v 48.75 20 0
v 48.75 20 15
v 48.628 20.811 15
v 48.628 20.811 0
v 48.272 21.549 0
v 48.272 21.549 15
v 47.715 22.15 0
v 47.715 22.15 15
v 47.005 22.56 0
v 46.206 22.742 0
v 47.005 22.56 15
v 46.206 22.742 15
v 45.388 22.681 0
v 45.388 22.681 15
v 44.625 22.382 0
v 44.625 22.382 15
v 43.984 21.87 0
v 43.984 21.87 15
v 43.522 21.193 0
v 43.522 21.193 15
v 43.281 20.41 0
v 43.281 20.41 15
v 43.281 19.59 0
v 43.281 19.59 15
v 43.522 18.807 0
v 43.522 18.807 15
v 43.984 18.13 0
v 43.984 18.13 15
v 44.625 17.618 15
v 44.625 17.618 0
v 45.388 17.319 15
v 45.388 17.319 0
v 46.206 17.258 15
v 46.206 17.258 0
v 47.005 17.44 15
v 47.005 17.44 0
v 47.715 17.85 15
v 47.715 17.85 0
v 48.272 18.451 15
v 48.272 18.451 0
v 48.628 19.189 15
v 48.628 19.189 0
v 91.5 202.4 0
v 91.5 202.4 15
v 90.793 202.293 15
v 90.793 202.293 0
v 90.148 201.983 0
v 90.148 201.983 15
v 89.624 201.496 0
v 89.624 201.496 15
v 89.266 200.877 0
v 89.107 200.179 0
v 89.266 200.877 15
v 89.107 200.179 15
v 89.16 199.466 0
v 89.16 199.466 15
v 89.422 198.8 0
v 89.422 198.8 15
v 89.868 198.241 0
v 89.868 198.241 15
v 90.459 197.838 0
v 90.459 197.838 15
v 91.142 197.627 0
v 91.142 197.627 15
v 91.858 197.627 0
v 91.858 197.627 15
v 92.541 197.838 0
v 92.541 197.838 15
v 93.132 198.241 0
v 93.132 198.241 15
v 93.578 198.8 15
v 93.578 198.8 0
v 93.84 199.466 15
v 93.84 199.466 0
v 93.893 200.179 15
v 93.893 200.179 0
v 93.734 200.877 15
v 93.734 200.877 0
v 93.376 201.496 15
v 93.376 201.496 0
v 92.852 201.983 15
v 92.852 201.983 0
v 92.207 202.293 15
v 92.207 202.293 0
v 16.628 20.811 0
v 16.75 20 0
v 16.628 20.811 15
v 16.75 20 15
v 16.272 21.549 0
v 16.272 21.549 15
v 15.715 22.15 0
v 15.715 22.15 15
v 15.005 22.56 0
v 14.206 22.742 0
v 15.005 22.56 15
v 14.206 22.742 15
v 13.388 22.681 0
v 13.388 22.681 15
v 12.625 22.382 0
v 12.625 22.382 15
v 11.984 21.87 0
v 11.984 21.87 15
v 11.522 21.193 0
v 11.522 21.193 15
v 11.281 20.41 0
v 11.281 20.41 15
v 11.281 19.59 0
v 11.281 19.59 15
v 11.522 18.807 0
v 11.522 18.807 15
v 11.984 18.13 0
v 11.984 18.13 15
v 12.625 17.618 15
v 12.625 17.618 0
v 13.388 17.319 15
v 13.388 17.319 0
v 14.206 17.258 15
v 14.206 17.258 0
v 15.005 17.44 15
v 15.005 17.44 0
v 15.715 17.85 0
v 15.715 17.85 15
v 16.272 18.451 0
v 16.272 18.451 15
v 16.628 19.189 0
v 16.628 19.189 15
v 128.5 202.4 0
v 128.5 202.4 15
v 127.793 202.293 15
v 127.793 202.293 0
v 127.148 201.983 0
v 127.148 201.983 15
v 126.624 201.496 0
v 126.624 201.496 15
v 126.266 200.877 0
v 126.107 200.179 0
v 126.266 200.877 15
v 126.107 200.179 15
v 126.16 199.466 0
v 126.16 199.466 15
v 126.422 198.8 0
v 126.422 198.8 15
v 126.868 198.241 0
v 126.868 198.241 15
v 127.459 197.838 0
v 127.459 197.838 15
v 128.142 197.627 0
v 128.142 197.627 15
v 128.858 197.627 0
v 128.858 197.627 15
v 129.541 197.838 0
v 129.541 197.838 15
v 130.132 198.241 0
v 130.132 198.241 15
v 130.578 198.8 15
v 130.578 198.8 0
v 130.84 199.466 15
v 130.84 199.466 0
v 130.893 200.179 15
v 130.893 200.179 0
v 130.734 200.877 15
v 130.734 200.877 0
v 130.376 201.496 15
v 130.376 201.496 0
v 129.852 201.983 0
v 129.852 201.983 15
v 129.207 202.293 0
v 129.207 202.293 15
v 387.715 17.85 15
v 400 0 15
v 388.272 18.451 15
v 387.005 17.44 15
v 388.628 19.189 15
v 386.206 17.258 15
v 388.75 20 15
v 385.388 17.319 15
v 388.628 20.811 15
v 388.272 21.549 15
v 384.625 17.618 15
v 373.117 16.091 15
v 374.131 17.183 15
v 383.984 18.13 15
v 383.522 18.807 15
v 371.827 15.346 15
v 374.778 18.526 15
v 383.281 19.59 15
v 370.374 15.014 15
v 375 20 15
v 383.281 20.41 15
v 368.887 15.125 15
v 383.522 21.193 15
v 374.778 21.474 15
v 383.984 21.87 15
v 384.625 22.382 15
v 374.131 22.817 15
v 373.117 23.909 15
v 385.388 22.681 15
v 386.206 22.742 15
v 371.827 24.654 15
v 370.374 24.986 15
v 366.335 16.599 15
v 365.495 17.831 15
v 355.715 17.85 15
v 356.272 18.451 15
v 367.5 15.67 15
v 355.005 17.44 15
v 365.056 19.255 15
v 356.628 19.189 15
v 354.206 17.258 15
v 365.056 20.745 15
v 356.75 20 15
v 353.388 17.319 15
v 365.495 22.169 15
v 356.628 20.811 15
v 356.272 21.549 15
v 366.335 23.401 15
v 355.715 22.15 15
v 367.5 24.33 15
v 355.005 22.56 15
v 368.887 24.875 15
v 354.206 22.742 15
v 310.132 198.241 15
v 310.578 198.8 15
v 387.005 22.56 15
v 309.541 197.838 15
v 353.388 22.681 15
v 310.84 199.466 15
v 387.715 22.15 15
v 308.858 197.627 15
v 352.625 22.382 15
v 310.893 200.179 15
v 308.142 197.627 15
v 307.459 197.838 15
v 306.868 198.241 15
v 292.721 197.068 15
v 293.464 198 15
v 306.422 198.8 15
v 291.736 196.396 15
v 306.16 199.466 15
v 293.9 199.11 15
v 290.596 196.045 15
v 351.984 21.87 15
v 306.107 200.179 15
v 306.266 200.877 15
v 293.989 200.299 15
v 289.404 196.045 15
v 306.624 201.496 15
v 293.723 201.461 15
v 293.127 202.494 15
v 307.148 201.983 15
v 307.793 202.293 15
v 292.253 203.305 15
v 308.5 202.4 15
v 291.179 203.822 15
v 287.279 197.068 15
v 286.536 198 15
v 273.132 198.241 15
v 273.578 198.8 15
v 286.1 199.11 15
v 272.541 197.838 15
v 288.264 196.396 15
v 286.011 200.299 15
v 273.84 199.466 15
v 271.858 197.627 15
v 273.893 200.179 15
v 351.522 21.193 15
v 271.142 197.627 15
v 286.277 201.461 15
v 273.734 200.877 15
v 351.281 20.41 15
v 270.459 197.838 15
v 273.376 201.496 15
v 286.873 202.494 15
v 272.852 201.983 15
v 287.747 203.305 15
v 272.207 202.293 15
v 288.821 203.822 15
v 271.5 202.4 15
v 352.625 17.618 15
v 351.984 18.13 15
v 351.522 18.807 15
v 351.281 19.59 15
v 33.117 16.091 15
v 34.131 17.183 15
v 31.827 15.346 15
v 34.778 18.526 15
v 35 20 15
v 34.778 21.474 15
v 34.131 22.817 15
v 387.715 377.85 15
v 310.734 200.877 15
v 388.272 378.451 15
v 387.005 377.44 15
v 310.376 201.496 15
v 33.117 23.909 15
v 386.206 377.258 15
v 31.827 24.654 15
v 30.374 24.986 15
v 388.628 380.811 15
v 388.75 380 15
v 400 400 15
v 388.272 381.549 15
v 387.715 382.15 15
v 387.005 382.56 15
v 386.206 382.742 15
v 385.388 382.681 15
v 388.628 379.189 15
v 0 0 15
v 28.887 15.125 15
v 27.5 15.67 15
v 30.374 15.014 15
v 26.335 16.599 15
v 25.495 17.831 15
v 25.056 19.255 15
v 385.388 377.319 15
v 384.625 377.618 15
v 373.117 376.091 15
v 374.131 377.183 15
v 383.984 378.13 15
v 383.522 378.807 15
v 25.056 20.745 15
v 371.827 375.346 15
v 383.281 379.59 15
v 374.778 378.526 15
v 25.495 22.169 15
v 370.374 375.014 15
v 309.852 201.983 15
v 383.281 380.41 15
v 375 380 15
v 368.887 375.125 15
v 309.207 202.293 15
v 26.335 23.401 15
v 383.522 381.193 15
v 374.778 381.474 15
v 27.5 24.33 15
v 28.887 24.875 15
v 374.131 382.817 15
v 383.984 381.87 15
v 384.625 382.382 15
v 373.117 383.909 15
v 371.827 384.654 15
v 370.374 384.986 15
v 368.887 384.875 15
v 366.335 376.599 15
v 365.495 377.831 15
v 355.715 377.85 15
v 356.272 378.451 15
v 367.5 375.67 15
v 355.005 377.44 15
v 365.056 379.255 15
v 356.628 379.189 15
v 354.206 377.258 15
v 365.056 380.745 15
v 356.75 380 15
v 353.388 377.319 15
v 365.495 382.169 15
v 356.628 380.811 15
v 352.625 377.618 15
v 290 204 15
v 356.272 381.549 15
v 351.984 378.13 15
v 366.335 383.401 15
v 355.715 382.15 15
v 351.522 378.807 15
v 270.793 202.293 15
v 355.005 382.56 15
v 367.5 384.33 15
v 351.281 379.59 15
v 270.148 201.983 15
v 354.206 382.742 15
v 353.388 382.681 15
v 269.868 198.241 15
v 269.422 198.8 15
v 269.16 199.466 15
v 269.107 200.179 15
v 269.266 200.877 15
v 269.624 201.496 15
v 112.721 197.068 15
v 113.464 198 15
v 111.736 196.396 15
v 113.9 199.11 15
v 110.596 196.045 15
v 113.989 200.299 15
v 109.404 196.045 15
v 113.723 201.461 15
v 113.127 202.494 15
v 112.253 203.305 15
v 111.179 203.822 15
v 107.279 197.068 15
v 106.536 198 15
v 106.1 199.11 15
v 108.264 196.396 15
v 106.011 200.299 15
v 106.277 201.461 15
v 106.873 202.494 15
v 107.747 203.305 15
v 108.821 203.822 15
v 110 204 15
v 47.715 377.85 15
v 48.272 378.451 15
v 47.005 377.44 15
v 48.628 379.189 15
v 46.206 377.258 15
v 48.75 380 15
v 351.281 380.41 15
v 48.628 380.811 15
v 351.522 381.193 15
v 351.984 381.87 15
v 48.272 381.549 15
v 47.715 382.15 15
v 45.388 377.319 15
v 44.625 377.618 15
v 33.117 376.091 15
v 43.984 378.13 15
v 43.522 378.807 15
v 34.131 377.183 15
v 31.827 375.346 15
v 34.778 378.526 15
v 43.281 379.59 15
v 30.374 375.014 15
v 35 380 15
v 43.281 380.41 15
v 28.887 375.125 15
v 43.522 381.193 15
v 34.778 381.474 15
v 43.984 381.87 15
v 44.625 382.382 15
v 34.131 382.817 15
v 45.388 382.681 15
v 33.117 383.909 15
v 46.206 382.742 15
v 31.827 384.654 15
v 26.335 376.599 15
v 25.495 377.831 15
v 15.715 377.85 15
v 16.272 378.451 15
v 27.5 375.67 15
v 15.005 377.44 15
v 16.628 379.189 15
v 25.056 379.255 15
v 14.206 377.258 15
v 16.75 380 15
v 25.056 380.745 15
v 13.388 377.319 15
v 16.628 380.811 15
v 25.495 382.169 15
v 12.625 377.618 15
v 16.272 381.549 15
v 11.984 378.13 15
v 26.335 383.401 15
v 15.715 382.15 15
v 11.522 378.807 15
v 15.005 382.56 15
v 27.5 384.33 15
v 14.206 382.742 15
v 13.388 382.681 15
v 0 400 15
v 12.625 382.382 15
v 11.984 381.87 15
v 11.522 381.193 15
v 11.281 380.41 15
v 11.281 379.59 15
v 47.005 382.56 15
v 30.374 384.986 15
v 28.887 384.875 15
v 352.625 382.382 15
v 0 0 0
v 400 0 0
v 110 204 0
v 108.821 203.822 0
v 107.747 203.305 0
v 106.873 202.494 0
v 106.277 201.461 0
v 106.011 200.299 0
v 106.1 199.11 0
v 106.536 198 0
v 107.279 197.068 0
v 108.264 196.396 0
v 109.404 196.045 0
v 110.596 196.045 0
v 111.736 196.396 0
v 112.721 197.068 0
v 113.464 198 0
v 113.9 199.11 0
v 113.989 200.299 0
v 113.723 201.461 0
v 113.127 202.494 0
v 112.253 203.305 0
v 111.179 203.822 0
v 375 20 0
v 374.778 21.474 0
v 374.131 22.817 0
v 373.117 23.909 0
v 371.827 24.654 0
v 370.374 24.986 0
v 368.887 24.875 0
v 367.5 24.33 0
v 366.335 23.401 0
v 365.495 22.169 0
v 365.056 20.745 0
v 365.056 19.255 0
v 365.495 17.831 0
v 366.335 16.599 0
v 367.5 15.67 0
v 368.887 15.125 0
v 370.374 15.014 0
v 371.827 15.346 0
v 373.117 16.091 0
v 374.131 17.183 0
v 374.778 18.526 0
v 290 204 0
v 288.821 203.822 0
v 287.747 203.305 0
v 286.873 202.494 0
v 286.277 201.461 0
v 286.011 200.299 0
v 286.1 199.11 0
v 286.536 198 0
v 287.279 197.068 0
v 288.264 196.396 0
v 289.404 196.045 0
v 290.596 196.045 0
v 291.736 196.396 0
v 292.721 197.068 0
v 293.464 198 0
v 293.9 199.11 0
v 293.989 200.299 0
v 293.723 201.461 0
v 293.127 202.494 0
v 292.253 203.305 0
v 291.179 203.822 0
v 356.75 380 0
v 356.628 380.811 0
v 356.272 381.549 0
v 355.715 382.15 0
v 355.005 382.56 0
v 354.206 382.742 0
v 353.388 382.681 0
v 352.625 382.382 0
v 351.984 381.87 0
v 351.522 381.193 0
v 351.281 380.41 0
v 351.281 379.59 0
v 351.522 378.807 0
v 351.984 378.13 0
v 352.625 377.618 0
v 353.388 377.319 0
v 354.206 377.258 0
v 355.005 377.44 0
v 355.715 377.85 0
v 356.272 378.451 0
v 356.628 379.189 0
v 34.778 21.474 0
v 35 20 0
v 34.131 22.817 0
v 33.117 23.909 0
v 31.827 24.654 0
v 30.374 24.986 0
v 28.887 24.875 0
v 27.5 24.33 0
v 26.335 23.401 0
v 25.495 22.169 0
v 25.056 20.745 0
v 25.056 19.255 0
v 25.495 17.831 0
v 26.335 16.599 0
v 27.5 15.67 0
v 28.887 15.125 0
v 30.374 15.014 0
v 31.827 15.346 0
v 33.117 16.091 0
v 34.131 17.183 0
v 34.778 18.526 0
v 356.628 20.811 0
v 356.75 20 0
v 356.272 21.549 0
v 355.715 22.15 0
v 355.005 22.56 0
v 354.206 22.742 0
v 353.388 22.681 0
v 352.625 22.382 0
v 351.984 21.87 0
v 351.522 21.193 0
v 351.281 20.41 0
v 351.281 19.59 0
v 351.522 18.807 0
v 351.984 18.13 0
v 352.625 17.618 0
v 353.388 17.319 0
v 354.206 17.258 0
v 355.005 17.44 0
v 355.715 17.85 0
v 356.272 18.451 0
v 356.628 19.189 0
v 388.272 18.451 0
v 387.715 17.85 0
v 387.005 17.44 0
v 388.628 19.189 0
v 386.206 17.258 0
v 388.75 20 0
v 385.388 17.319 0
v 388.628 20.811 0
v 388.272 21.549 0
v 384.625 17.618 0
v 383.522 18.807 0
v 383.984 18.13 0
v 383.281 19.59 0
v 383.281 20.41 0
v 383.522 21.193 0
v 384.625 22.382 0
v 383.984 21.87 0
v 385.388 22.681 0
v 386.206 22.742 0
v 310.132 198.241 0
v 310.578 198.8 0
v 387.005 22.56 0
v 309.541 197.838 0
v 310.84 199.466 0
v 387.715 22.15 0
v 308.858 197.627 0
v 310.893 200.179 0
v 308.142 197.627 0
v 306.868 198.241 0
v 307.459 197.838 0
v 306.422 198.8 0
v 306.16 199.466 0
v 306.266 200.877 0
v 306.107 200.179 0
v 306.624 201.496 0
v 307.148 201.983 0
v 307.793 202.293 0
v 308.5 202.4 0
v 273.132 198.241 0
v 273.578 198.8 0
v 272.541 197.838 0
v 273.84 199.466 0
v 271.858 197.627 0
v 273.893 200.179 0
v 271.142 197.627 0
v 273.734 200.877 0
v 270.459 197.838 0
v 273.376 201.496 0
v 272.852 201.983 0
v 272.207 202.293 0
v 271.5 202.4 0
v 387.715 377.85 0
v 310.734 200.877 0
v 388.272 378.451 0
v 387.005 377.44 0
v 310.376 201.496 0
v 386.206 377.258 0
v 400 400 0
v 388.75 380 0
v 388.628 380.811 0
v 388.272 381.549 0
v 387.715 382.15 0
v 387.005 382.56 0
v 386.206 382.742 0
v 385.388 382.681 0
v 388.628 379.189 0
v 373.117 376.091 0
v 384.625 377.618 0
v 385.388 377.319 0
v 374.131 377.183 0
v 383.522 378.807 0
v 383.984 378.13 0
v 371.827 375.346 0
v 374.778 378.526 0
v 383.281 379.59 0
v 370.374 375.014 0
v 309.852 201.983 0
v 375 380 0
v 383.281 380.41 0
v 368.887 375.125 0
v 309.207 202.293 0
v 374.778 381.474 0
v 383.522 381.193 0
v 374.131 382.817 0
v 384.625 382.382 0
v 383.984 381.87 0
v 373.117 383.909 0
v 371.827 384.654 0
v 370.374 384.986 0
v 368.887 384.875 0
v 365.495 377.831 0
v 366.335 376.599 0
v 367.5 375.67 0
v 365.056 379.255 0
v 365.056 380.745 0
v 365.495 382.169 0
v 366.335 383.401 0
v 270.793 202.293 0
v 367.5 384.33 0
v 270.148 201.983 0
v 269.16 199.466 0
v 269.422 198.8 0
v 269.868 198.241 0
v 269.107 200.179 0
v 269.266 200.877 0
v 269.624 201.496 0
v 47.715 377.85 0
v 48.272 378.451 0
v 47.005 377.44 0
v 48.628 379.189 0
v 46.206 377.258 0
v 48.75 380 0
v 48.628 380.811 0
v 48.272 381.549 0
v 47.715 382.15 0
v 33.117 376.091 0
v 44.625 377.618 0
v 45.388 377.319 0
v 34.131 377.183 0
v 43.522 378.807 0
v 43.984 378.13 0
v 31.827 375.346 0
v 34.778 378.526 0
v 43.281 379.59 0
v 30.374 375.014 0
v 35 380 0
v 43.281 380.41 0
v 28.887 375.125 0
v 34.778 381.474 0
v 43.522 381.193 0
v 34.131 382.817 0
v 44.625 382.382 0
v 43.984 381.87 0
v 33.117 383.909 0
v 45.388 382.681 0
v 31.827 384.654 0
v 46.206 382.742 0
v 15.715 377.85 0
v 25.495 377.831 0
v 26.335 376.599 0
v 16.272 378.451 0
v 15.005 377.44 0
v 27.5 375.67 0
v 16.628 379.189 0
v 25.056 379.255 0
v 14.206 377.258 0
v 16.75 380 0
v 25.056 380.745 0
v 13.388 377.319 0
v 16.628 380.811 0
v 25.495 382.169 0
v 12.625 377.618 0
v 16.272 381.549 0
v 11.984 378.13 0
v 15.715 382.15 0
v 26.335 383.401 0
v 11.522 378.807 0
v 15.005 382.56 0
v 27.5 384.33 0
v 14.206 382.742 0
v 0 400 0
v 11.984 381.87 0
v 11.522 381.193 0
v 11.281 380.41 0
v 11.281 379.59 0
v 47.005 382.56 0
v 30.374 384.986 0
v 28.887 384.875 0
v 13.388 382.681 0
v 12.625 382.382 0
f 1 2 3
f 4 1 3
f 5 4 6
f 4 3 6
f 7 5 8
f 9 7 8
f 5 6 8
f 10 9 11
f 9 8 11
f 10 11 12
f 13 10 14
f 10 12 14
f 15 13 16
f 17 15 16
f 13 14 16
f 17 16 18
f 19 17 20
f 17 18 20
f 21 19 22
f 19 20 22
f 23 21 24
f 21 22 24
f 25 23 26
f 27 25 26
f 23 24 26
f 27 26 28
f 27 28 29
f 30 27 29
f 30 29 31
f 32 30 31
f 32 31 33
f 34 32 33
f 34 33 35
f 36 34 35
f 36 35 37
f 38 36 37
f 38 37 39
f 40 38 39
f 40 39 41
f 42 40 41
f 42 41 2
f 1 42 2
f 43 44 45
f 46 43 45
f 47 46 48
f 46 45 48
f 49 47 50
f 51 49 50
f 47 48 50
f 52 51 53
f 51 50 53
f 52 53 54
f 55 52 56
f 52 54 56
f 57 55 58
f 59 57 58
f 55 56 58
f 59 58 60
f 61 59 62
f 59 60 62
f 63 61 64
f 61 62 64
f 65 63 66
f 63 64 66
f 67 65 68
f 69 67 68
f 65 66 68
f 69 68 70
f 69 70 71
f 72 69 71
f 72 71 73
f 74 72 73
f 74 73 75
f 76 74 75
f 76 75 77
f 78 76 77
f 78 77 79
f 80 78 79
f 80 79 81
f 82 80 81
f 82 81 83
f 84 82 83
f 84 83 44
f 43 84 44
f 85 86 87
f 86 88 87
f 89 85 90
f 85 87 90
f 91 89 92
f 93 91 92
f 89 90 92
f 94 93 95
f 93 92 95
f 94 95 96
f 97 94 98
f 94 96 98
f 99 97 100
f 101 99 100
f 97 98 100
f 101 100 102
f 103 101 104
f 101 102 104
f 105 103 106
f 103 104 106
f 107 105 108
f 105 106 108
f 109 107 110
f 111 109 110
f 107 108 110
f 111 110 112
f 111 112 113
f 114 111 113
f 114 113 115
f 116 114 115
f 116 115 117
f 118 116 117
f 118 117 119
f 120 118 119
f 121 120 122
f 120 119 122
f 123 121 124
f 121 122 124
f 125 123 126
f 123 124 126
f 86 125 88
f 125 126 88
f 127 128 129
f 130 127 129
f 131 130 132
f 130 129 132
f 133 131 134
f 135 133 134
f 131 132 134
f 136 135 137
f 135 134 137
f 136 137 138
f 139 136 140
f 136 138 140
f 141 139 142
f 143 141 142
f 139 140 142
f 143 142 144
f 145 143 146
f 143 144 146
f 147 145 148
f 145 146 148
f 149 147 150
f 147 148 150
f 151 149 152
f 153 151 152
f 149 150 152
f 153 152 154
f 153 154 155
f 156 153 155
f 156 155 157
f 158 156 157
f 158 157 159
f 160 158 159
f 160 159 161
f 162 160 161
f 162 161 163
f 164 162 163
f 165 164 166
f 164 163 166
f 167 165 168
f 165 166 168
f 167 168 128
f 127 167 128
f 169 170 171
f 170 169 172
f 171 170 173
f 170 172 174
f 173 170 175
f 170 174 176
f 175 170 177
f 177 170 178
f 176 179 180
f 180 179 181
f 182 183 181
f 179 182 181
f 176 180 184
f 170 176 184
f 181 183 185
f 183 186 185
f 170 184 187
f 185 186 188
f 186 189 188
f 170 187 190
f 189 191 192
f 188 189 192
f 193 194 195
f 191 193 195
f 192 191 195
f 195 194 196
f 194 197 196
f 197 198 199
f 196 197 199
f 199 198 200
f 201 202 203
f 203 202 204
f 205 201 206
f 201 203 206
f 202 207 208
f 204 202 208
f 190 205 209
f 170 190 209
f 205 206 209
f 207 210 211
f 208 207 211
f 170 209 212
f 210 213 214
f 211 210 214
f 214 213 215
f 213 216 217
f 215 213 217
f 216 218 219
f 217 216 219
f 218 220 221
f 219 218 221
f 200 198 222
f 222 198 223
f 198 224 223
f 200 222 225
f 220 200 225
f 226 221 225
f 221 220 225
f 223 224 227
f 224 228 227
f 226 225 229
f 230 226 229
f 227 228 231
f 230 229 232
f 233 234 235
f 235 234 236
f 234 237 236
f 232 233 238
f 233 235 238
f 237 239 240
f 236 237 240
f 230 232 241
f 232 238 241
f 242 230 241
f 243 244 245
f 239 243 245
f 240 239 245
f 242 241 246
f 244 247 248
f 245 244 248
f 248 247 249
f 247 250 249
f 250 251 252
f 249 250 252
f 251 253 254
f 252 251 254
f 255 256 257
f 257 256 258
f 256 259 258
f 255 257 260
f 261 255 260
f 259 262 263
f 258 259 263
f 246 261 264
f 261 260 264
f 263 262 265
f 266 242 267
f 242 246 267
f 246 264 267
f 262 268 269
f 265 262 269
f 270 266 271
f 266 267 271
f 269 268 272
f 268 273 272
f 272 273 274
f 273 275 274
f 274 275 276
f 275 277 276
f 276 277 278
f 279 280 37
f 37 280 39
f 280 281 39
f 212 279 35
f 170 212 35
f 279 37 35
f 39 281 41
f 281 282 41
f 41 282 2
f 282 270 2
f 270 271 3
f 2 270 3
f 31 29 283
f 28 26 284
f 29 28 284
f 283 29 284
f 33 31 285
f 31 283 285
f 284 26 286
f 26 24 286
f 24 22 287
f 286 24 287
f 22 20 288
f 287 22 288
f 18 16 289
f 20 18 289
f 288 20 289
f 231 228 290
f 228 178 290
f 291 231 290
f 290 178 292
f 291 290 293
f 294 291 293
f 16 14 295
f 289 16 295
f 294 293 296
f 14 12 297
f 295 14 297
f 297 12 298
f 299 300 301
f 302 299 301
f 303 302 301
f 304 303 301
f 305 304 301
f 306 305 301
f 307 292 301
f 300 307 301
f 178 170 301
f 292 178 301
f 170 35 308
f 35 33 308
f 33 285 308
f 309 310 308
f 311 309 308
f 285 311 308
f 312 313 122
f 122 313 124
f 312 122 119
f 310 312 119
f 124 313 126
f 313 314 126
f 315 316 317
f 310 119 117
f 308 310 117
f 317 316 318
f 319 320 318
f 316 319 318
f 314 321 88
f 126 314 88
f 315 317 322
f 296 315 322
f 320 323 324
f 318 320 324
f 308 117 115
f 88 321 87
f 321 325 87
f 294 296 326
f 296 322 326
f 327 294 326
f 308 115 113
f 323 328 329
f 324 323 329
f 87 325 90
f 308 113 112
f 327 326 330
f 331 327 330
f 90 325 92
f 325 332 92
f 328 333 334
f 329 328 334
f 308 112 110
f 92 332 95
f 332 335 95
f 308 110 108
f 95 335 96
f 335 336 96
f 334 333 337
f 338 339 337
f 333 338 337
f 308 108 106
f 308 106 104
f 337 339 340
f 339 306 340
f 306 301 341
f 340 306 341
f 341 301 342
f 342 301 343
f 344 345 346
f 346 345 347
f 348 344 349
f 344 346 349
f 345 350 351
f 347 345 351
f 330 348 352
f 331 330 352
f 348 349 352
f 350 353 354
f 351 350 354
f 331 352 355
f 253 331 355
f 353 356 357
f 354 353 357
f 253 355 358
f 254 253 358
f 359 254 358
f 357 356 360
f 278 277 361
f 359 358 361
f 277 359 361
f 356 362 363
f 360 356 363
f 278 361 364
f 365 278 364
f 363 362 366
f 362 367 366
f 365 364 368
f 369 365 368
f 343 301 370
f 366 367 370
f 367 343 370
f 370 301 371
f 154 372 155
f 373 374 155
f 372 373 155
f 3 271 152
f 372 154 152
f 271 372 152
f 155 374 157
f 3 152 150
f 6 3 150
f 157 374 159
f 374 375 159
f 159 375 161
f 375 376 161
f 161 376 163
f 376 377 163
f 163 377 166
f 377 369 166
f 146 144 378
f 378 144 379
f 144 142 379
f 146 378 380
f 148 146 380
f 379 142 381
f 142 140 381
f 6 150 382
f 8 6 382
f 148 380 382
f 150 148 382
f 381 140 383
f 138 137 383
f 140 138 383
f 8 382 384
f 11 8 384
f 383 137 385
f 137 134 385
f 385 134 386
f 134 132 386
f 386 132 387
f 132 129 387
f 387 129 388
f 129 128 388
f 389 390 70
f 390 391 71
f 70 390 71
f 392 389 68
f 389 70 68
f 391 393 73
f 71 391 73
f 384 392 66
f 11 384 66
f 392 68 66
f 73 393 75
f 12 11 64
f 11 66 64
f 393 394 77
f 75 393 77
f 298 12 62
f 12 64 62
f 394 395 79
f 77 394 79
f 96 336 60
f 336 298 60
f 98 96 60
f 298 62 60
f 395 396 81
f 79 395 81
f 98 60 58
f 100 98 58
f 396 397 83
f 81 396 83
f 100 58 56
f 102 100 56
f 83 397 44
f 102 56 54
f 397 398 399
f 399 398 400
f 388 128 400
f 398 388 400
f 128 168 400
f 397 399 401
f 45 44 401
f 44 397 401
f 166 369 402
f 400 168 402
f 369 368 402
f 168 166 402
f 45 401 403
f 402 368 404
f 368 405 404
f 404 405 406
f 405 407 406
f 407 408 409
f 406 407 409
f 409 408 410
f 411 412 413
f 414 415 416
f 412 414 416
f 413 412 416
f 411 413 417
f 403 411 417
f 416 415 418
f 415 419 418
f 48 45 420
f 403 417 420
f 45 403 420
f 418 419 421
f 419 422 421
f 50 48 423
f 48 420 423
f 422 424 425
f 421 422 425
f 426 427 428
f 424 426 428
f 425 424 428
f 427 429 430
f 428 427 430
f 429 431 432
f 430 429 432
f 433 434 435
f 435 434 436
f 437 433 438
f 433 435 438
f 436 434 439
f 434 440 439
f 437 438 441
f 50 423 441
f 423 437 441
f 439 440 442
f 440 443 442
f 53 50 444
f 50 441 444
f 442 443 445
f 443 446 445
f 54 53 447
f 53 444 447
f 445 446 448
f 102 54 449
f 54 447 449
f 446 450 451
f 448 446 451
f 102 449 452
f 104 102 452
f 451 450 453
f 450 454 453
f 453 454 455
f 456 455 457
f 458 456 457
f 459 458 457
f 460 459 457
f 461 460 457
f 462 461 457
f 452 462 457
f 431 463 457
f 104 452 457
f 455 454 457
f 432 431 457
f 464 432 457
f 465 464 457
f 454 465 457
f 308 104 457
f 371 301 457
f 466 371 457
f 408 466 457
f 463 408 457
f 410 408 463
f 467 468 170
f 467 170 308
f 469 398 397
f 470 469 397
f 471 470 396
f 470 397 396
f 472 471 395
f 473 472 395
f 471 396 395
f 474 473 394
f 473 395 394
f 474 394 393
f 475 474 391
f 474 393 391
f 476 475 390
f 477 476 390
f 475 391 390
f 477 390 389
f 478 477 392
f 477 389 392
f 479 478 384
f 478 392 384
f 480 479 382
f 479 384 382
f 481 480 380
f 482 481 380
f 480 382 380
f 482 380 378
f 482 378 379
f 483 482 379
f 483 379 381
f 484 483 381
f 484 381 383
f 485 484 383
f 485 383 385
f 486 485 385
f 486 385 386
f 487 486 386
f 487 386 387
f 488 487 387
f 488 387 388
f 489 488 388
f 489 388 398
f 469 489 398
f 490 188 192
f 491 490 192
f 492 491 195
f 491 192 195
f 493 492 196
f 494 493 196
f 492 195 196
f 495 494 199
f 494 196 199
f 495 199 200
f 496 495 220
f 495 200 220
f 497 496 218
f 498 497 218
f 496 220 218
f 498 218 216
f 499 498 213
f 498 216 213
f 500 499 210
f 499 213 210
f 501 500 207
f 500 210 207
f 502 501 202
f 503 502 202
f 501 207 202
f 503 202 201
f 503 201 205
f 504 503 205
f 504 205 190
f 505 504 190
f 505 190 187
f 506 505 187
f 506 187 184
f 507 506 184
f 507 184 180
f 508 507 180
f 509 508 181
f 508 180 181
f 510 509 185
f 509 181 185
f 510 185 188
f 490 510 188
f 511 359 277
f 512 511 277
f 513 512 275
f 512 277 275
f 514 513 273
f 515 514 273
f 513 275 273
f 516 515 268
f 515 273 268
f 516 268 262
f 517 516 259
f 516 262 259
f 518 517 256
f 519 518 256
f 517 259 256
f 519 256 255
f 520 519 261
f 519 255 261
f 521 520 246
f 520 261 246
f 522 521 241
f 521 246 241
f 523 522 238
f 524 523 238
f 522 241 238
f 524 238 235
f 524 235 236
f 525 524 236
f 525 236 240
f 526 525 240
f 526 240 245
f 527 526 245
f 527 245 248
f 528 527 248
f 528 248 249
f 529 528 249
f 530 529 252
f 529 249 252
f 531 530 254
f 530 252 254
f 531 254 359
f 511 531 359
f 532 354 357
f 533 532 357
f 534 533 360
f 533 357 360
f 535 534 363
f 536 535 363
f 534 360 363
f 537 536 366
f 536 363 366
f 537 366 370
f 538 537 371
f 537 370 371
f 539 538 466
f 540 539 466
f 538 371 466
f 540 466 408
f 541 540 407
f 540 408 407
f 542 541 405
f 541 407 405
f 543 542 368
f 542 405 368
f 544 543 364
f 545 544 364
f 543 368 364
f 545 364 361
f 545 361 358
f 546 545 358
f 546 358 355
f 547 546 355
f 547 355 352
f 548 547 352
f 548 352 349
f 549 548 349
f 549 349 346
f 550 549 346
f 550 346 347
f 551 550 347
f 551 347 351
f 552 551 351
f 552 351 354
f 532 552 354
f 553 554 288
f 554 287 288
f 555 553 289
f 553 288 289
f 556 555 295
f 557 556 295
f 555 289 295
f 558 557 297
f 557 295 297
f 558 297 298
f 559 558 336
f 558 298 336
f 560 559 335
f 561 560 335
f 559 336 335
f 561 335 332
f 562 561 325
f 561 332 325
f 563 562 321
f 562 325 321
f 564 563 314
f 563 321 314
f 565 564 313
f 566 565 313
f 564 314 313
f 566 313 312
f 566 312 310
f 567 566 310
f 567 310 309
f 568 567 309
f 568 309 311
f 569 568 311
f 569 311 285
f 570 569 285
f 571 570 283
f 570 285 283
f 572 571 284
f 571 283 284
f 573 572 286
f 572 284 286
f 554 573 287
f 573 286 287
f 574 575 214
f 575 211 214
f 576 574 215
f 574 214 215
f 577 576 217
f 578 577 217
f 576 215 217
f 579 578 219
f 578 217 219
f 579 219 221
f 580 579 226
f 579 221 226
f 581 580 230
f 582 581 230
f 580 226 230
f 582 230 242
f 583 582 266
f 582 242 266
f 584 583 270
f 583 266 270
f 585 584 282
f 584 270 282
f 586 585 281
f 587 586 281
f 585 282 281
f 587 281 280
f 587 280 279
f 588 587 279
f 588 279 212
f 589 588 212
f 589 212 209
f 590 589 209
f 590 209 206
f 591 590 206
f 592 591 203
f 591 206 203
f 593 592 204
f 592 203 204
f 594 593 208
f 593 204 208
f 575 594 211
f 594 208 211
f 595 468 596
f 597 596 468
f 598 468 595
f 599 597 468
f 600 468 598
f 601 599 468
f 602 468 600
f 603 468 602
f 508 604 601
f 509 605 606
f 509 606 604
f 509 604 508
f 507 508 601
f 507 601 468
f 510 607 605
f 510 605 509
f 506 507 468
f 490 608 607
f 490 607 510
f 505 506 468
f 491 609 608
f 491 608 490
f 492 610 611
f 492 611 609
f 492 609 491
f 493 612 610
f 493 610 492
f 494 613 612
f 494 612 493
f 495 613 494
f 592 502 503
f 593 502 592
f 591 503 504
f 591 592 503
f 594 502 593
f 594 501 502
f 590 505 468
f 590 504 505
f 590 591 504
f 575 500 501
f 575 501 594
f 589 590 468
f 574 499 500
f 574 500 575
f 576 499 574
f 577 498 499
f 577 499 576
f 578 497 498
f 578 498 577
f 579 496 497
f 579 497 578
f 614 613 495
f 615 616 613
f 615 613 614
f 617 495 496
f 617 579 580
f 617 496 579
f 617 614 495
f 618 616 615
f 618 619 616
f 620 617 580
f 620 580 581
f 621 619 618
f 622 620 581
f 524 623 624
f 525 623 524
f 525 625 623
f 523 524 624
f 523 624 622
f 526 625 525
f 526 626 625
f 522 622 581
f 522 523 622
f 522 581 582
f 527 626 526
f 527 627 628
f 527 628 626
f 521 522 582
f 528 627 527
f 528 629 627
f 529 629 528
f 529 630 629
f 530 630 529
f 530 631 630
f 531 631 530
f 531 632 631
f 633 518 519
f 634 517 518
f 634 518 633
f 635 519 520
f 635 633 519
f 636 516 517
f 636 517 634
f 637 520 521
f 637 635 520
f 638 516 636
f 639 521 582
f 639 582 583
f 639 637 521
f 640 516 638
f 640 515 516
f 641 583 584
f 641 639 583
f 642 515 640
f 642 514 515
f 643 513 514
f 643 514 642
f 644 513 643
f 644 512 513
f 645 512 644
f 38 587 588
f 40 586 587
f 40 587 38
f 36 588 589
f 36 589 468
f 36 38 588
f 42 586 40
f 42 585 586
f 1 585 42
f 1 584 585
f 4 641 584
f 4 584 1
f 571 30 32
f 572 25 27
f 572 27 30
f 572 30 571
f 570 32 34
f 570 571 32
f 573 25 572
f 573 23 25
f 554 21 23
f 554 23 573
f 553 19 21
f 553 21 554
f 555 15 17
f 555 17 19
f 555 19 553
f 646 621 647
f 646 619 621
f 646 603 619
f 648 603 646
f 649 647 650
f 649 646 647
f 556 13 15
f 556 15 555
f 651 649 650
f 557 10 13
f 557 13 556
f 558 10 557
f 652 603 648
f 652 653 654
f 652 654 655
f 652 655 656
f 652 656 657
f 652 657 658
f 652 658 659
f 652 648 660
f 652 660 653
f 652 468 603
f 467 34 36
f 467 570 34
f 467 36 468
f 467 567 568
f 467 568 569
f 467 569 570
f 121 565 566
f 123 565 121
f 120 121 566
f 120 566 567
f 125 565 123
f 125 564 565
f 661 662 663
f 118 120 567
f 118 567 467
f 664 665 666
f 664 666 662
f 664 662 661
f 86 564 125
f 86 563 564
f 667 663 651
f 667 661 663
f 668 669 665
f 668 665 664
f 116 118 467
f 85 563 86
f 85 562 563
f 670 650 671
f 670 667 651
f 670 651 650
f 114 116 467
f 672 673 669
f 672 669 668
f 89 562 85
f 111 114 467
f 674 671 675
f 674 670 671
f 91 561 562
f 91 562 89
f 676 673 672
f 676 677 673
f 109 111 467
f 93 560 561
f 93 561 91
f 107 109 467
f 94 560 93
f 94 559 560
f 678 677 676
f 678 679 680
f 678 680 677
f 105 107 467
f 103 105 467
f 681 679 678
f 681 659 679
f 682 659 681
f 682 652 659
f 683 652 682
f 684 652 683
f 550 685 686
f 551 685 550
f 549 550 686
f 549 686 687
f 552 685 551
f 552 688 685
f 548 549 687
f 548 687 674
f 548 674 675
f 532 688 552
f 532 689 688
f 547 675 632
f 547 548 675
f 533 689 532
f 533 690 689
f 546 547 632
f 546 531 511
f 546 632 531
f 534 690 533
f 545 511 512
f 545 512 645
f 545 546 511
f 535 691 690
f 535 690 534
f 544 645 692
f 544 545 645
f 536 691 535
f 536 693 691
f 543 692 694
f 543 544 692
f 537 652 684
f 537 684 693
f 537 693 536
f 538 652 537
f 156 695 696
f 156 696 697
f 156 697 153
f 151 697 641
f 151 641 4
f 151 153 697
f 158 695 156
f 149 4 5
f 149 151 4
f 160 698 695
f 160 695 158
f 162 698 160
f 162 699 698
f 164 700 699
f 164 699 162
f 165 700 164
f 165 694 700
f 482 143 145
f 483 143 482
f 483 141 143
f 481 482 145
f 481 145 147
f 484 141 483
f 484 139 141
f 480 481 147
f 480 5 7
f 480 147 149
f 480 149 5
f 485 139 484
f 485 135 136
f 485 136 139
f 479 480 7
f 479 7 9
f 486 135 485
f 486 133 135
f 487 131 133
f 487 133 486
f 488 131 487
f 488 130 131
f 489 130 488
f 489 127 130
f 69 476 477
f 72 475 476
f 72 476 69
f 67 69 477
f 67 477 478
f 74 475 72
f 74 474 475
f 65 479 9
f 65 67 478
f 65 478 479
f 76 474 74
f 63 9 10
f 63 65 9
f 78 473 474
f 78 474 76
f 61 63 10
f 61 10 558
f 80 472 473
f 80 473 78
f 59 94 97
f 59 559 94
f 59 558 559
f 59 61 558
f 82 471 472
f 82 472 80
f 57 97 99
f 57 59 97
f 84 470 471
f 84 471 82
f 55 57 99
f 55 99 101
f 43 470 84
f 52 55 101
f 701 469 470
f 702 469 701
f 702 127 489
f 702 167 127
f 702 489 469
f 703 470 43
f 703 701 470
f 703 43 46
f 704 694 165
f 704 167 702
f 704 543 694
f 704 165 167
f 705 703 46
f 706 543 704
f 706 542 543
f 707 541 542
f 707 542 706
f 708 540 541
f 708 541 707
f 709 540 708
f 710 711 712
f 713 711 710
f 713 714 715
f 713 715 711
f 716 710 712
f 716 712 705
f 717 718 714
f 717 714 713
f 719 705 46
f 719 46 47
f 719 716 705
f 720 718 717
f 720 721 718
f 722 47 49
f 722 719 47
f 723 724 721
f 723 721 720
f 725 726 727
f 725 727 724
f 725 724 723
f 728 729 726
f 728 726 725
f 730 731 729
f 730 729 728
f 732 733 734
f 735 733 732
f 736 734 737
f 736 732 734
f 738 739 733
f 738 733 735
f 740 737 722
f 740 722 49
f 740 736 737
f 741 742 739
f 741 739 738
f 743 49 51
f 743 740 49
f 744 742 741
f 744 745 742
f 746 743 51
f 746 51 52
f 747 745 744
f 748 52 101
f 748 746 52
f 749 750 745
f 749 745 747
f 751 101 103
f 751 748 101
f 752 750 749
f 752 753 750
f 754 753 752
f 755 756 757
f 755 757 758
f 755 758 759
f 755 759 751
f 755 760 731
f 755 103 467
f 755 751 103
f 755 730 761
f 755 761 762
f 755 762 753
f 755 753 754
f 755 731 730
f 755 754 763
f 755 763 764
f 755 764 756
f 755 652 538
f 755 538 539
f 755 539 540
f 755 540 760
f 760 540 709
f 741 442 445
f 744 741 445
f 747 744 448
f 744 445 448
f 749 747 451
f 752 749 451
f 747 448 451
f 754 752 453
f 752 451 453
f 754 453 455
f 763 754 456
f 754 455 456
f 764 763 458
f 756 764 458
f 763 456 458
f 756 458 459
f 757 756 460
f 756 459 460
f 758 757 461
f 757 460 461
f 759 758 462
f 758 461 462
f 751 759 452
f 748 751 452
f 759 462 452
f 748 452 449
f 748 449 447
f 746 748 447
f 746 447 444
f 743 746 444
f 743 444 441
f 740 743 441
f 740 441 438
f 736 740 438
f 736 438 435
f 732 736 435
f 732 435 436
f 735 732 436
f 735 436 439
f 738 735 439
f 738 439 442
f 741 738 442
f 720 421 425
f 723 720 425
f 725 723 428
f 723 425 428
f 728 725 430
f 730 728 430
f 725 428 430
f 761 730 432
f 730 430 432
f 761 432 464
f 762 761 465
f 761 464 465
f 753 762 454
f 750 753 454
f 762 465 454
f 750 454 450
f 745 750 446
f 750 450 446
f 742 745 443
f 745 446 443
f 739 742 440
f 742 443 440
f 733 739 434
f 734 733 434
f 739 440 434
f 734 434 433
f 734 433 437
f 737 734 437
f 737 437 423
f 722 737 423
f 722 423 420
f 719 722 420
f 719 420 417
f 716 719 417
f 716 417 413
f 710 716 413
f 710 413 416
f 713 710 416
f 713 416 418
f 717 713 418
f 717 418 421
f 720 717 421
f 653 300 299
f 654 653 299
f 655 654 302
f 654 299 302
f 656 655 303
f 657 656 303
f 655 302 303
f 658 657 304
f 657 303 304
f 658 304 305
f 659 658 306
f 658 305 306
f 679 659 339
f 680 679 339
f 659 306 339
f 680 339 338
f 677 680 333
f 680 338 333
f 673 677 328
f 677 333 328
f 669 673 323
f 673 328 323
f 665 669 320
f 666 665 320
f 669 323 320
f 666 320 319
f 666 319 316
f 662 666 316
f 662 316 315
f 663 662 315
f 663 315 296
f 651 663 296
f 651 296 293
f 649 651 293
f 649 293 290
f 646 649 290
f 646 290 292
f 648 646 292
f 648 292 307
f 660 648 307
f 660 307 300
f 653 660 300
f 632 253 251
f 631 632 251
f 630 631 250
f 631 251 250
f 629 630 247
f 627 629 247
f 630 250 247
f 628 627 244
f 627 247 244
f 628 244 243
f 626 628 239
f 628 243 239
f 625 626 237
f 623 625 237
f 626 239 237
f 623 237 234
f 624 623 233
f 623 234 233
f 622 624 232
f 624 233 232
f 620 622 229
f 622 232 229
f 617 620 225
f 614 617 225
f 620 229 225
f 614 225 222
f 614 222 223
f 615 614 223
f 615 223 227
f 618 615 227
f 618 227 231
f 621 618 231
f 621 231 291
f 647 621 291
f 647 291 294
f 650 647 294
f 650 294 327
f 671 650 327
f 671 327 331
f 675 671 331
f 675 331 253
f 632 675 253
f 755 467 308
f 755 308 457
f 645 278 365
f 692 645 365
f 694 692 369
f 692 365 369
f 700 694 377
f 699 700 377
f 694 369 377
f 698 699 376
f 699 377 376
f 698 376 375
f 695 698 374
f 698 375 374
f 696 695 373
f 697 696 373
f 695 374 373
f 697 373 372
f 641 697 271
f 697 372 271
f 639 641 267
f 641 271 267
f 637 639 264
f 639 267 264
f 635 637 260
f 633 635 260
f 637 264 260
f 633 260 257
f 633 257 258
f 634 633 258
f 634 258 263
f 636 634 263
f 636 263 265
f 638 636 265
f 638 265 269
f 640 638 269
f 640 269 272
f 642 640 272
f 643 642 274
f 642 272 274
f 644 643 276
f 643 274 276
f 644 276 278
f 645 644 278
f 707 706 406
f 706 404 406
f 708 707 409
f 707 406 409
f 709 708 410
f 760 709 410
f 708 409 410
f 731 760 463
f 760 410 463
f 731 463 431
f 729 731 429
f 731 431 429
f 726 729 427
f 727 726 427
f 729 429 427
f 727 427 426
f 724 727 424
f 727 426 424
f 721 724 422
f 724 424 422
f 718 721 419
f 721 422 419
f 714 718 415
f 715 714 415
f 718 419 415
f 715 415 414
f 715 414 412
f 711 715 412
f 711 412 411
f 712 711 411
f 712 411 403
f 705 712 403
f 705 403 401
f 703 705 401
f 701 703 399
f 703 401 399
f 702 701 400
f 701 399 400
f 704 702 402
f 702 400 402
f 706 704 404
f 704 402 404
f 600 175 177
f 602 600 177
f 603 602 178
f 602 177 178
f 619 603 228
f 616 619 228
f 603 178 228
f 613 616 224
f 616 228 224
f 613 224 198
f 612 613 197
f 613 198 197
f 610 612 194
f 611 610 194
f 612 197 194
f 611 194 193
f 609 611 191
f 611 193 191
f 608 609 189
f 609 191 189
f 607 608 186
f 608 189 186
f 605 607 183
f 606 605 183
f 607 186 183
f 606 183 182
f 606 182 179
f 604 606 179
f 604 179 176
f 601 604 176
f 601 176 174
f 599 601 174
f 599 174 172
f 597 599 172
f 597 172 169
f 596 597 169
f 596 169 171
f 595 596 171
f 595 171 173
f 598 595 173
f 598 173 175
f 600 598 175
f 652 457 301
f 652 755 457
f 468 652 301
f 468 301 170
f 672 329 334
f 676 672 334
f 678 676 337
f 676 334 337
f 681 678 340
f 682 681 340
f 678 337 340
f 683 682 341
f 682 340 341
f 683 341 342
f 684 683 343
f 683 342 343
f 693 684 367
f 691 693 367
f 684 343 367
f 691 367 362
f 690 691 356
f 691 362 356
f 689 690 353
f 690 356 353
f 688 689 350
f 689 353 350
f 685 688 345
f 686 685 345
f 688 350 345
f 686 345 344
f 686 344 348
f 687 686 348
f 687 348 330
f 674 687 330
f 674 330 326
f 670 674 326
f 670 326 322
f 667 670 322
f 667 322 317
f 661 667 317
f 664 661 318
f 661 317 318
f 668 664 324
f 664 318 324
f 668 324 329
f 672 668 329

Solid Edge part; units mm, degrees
sketch "Sketch1" plane through (0, 0, 0) normal (0, 0, 1) x (1, 0, 0)
  line L0 (400, 0) -> (0, 0)
  line L1 (0, 0) -> (0, 400)
  line L2 (0, 400) -> (400, 400)
  line L3 (400, 400) -> (400, 0)
extrude "Protrusion1" add sketch "Sketch1" along normal blind 15
sketch "Sketch2" plane through (200, 200, 15) normal (0, 0, 1) x (1, 0, 0)
  circle A0 centre (-170, 180) radius 5
extrude "VaciadoExtruido_1" cut sketch "Sketch2" against normal blind 15
sketch "Sketch3" plane through (200, 200, 15) normal (0, 0, 1) x (1, 0, 0)
  circle A0 centre (-154, 180) radius 2.75
extrude "VaciadoExtruido_2" cut sketch "Sketch3" against normal blind 15
sketch "Sketch4" plane through (200, 200, 15) normal (0, 0, 1) x (1, 0, 0)
  circle A0 centre (-186, 180) radius 2.75
extrude "VaciadoExtruido_3" cut sketch "Sketch4" against normal blind 15
sketch "Sketch5" plane through (200, 200, 15) normal (0, 0, 1) x (1, 0, 0)
  circle A0 centre (170, 180) radius 5
extrude "VaciadoExtruido_4" cut sketch "Sketch5" against normal blind 15
sketch "Sketch6" plane through (200, 200, 15) normal (0, 0, 1) x (1, 0, 0)
  circle A0 centre (154, 180) radius 2.75
extrude "VaciadoExtruido_5" cut sketch "Sketch6" against normal blind 15
sketch "Sketch7" plane through (200, 200, 15) normal (0, 0, 1) x (1, 0, 0)
  circle A0 centre (186, 180) radius 2.75
extrude "VaciadoExtruido_6" cut sketch "Sketch7" against normal blind 15
sketch "Sketch8" plane through (200, 200, 15) normal (0, 0, 1) x (1, 0, 0)
  circle A0 centre (170, -180) radius 5
extrude "VaciadoExtruido_7" cut sketch "Sketch8" against normal blind 15
sketch "Sketch9" plane through (200, 200, 15) normal (0, 0, 1) x (1, 0, 0)
  circle A0 centre (186, -180) radius 2.75
extrude "VaciadoExtruido_8" cut sketch "Sketch9" against normal blind 15
sketch "Sketch10" plane through (200, 200, 15) normal (0, 0, 1) x (1, 0, 0)
  circle A0 centre (154, -180) radius 2.75
extrude "VaciadoExtruido_9" cut sketch "Sketch10" against normal blind 15
sketch "Sketch11" plane through (200, 200, 15) normal (0, 0, 1) x (1, 0, 0)
  circle A0 centre (-170, -180) radius 5
extrude "VaciadoExtruido_10" cut sketch "Sketch11" against normal blind 15
sketch "Sketch12" plane through (200, 200, 15) normal (0, 0, 1) x (1, 0, 0)
  circle A0 centre (-154, -180) radius 2.75
extrude "VaciadoExtruido_11" cut sketch "Sketch12" against normal blind 15
sketch "Sketch13" plane through (200, 200, 15) normal (0, 0, 1) x (1, 0, 0)
  circle A0 centre (-186, -180) radius 2.75
extrude "VaciadoExtruido_12" cut sketch "Sketch13" against normal blind 15
sketch "Sketch14" plane through (200, 200, 15) normal (0, 0, 1) x (0, 1, 0)
  circle A0 centre (0, 90) radius 4
extrude "VaciadoExtruido_13" cut sketch "Sketch14" against normal blind 15
sketch "Sketch15" plane through (200, 200, 15) normal (0, 0, 1) x (0, 1, 0)
  circle A0 centre (0, 108.5) radius 2.4
extrude "VaciadoExtruido_14" cut sketch "Sketch15" against normal blind 15
sketch "Sketch16" plane through (200, 200, 15) normal (0, 0, 1) x (0, 1, 0)
  circle A0 centre (0, 71.5) radius 2.4
extrude "VaciadoExtruido_15" cut sketch "Sketch16" against normal blind 15
sketch "Sketch17" plane through (200, 200, 15) normal (0, 0, 1) x (0, 1, 0)
  circle A0 centre (0, -90) radius 4
extrude "VaciadoExtruido_16" cut sketch "Sketch17" against normal blind 15
sketch "Sketch18" plane through (200, 200, 15) normal (0, 0, 1) x (0, 1, 0)
  circle A0 centre (0, -71.5) radius 2.4
extrude "VaciadoExtruido_17" cut sketch "Sketch18" against normal blind 15
sketch "Sketch19" plane through (200, 200, 15) normal (0, 0, 1) x (0, 1, 0)
  circle A0 centre (0, -108.5) radius 2.4
extrude "VaciadoExtruido_18" cut sketch "Sketch19" against normal blind 15
